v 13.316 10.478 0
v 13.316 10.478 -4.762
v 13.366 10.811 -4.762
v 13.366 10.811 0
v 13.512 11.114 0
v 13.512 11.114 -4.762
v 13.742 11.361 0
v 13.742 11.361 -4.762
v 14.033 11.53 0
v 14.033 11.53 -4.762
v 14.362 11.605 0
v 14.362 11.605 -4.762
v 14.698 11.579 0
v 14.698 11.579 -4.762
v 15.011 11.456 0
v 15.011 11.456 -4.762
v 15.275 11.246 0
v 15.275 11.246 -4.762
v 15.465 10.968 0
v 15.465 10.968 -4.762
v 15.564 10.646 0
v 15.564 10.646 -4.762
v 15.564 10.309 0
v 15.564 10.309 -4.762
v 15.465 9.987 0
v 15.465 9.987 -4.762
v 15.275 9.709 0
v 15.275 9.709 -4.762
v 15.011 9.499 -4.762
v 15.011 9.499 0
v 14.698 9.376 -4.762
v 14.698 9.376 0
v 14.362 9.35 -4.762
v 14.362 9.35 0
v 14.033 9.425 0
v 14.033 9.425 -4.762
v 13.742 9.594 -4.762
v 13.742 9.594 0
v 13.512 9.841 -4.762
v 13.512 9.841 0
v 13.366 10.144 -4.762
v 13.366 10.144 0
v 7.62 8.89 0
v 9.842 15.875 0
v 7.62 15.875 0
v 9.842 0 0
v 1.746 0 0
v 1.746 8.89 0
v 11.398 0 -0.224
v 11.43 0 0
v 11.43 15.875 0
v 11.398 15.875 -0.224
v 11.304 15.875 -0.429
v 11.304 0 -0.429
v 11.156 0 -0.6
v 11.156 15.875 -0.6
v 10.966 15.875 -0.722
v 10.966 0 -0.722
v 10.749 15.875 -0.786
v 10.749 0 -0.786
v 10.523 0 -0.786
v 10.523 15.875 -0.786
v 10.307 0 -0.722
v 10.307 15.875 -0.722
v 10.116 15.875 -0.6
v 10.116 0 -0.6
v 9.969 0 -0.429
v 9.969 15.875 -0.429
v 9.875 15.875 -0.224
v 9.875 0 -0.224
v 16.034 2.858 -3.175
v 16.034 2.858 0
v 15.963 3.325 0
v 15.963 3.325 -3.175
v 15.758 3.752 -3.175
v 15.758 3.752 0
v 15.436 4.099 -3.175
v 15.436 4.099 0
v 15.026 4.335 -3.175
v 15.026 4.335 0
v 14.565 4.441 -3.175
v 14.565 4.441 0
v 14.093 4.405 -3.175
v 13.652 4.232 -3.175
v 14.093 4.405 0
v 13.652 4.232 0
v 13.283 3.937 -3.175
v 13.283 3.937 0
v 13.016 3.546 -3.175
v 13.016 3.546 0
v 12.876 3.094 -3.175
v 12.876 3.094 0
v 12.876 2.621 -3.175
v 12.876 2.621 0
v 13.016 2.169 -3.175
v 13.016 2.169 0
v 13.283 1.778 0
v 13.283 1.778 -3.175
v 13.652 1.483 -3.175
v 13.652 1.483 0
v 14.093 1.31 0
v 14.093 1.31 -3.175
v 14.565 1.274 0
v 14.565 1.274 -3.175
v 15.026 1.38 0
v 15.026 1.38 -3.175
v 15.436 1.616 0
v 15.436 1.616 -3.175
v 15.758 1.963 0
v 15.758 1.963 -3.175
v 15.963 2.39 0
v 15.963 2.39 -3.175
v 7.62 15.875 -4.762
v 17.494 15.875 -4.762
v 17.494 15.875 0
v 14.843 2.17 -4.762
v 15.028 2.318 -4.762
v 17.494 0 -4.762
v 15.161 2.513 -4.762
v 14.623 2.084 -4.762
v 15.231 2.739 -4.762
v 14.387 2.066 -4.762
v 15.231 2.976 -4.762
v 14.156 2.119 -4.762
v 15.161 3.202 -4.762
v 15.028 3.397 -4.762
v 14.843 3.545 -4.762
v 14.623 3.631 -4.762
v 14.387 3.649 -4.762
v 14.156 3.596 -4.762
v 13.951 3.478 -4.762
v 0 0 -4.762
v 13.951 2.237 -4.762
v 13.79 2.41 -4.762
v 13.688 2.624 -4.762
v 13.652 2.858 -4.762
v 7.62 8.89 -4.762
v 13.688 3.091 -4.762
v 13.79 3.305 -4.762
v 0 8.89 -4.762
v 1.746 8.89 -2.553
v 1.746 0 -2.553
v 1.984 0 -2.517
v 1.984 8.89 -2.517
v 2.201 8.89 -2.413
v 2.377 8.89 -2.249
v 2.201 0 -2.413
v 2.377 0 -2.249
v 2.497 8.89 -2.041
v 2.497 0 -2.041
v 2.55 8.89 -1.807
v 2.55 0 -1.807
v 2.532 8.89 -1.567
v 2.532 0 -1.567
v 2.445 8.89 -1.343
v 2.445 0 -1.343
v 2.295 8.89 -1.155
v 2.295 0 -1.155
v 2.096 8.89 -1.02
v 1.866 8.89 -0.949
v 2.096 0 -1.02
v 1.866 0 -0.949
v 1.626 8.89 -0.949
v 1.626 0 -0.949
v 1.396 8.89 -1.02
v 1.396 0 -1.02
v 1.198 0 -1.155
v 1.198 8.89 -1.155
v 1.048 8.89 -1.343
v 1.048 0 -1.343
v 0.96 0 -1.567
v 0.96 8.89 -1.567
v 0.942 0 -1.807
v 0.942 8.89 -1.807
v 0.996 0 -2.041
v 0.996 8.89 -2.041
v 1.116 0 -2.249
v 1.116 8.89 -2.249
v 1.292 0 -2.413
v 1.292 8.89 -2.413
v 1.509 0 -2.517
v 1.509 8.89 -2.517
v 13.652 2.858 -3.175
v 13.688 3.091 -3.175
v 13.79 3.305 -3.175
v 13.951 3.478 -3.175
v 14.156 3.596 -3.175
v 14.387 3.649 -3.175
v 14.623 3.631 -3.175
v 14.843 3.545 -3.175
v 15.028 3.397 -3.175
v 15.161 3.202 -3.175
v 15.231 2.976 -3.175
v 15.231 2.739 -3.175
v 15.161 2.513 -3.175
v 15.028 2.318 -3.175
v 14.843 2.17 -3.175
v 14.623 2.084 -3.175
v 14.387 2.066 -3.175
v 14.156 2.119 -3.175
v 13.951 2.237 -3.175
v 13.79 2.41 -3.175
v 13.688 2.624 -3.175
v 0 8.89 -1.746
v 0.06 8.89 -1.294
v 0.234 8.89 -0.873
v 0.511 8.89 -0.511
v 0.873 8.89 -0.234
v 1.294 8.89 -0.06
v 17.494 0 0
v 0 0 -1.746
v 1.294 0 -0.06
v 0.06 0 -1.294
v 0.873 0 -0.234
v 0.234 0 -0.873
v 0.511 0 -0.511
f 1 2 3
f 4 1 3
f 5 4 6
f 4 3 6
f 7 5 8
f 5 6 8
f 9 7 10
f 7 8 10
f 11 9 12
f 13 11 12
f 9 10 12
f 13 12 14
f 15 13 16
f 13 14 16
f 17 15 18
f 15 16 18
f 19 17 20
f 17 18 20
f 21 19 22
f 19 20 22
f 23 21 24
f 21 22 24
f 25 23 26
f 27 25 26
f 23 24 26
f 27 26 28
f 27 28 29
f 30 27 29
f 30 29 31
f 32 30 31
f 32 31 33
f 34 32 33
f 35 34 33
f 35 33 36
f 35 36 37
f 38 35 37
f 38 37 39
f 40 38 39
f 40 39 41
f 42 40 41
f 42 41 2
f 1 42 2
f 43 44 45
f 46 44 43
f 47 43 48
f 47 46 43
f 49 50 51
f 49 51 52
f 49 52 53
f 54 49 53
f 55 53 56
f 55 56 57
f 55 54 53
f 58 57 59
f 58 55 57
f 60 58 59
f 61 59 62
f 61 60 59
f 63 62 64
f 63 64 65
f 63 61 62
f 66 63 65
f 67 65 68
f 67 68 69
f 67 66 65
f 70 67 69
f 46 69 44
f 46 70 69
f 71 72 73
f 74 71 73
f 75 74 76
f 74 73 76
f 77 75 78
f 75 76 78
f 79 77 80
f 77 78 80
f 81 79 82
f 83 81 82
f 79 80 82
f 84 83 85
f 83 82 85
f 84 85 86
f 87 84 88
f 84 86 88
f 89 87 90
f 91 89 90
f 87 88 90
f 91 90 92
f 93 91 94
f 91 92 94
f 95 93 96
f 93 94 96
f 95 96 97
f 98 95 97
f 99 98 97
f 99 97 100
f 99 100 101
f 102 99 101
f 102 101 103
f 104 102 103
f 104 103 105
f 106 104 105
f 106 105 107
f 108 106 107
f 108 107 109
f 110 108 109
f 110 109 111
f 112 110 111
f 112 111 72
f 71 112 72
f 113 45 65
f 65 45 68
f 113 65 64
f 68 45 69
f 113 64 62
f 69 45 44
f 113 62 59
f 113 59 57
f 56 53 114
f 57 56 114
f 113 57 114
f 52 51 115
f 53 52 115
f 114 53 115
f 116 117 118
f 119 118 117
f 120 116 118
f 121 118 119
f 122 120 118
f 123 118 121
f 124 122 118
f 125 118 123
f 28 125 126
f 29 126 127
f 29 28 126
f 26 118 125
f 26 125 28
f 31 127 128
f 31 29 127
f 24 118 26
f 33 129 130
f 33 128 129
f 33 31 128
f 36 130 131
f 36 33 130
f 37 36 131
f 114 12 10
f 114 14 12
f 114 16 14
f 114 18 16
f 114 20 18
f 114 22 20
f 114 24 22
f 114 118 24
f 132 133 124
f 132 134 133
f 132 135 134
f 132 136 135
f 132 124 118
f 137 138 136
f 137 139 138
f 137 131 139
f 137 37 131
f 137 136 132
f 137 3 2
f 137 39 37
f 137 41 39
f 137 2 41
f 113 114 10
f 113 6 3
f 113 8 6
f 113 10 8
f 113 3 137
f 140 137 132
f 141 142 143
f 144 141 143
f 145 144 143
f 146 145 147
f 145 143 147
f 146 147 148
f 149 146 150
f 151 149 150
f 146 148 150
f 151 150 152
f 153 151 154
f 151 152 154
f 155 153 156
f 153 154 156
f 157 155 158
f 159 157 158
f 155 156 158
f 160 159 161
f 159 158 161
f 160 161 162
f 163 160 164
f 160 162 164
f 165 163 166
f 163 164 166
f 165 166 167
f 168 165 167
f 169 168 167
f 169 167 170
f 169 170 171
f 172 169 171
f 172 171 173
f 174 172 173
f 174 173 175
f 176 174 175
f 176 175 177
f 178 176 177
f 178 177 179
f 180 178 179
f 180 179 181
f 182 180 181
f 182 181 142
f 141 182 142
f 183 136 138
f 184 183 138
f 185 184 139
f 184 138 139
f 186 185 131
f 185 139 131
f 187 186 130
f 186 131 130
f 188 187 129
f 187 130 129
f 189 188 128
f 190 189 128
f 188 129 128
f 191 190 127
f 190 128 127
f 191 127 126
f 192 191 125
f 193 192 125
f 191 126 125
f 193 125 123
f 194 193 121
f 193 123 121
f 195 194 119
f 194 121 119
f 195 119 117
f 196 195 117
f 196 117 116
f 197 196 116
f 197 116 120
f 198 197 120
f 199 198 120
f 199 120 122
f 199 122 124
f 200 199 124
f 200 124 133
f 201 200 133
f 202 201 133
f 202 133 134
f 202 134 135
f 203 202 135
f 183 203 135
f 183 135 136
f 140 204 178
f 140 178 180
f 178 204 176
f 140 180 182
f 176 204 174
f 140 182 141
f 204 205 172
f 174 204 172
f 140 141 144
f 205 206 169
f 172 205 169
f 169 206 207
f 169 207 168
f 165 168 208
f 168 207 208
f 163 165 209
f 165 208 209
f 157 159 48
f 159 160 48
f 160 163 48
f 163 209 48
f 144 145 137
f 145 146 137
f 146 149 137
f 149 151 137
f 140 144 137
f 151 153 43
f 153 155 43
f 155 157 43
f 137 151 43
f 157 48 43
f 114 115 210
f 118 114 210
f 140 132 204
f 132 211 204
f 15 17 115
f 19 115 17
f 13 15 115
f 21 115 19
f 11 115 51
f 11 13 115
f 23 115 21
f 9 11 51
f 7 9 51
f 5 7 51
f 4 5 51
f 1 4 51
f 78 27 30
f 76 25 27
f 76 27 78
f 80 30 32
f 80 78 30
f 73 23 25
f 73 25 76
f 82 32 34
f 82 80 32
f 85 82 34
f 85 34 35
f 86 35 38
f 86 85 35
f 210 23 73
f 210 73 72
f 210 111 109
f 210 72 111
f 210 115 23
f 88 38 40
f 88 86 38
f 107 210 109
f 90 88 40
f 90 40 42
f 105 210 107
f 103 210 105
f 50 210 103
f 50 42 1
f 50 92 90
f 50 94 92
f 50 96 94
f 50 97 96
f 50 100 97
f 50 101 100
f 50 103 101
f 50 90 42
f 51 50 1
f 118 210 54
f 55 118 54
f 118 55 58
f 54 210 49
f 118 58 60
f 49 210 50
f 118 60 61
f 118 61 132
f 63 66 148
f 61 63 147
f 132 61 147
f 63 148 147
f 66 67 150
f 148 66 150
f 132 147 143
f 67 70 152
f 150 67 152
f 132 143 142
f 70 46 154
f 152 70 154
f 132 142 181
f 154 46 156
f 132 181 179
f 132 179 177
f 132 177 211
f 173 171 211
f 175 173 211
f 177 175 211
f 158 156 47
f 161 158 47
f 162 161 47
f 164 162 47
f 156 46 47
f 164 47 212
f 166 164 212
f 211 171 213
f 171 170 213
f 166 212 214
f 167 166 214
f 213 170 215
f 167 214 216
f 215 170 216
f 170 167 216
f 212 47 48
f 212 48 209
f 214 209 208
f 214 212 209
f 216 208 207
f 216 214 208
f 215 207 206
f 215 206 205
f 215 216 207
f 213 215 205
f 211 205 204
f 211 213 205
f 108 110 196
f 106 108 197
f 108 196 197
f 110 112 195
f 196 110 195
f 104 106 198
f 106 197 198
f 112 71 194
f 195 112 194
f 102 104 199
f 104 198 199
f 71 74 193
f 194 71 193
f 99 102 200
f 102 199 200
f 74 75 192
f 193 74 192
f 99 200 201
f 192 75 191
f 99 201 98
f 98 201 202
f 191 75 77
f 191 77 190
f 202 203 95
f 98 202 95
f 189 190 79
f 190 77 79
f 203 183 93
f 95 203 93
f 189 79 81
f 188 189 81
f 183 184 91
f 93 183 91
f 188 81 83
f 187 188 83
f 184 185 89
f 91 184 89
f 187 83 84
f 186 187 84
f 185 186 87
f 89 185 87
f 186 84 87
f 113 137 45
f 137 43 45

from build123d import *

# Parameters (mm, degrees)
BOSS_EXTRUDE1_DEPTH            = 15.875
F_52_0_0635_DIAMETER_HOLE1_D   = 1.6129
SKETCH3_W                      = 7.62
SKETCH3_H                      = 6.985
CUT_EXTRUDE1_DEPTH             = 24.835793107
SKETCH5_R                      = 1.5875
CUT_EXTRUDE2_DEPTH             = 3.302
BOSS_EXTRUDE2_DEPTH            = 1.5875
F_4_40_TAPPED_HOLE1_D          = 2.2606
F_1_16_0_0625_DIAMETER_HOLE1_D = 1.5875


with BuildPart() as part:
    # Sketch1 → Boss-Extrude1 (new body)
    with BuildSketch(Plane(origin=(0, 0, 0), x_dir=(1, 0, 0), z_dir=(0, 1, 0))):
        with BuildLine():
            Line((0, 1.74625), (0, 3.175))
            Line((0, 3.175), (17.49425, 3.175))
            Line((17.49425, 3.175), (17.49425, 0))
            Line((17.49425, 0), (11.43, 0))
            ThreePointArc((11.43, 0), (10.63625, 0.79375), (9.8425, 0))
            Line((9.8425, 0), (1.74625, 0))
            ThreePointArc((1.74625, 0), (0.511464783, 0.511464783), (0, 1.74625))
        make_face()
    extrude(amount=BOSS_EXTRUDE1_DEPTH)

    # #52 (0.0635) Diameter Hole1 (through all)
    with Locations(Plane(origin=(1.74625, 15.875, -1.74625), x_dir=(0, 0, 1), z_dir=(0, 1, 0))):
        with Locations((0, 0)):
            Hole(F_52_0_0635_DIAMETER_HOLE1_D / 2)

    # Sketch3 → Cut-Extrude1 (cut, through all)
    with BuildSketch(Plane(origin=(0, 0, -3.175), x_dir=(-1, 0, 0), z_dir=(0, 0, -1))):
        with Locations((-3.81, 12.3825)):
            Rectangle(SKETCH3_W, SKETCH3_H)
    extrude(amount=-CUT_EXTRUDE1_DEPTH, mode=Mode.SUBTRACT)

    # Sketch5 → Cut-Extrude2 (cut)
    with BuildSketch(Plane.XY):
        with Locations((14.44625, 2.8575)):
            Circle(SKETCH5_R)
    extrude(amount=-CUT_EXTRUDE2_DEPTH, mode=Mode.SUBTRACT)

    # Sketch7 → Boss-Extrude2 (add)
    with BuildSketch(Plane(origin=(0, 0, -3.175), x_dir=(-1, 0, 0), z_dir=(0, 0, -1))):
        Polygon((-17.49425, 0), (0, 0), (0, 8.89), (-7.62, 8.89), (-7.62, 15.875), (-17.49425, 15.875), align=None)
    extrude(amount=BOSS_EXTRUDE2_DEPTH)

    # #4-40 Tapped Hole1 (through all)
    with Locations(Plane(origin=(14.44625, 10.4775, 0), x_dir=(1, 0, 0), z_dir=(0, 0, 1))):
        with Locations((0, 0)):
            Hole(F_4_40_TAPPED_HOLE1_D / 2)

    # 1/16 (0.0625) Diameter Hole1 (through all)
    with Locations(Plane(origin=(14.44625, 2.8575, -3.175), x_dir=(1, 0, 0), z_dir=(0, 0, 1))):
        with Locations((0, 0)):
            Hole(F_1_16_0_0625_DIAMETER_HOLE1_D / 2)


solid = part.part
